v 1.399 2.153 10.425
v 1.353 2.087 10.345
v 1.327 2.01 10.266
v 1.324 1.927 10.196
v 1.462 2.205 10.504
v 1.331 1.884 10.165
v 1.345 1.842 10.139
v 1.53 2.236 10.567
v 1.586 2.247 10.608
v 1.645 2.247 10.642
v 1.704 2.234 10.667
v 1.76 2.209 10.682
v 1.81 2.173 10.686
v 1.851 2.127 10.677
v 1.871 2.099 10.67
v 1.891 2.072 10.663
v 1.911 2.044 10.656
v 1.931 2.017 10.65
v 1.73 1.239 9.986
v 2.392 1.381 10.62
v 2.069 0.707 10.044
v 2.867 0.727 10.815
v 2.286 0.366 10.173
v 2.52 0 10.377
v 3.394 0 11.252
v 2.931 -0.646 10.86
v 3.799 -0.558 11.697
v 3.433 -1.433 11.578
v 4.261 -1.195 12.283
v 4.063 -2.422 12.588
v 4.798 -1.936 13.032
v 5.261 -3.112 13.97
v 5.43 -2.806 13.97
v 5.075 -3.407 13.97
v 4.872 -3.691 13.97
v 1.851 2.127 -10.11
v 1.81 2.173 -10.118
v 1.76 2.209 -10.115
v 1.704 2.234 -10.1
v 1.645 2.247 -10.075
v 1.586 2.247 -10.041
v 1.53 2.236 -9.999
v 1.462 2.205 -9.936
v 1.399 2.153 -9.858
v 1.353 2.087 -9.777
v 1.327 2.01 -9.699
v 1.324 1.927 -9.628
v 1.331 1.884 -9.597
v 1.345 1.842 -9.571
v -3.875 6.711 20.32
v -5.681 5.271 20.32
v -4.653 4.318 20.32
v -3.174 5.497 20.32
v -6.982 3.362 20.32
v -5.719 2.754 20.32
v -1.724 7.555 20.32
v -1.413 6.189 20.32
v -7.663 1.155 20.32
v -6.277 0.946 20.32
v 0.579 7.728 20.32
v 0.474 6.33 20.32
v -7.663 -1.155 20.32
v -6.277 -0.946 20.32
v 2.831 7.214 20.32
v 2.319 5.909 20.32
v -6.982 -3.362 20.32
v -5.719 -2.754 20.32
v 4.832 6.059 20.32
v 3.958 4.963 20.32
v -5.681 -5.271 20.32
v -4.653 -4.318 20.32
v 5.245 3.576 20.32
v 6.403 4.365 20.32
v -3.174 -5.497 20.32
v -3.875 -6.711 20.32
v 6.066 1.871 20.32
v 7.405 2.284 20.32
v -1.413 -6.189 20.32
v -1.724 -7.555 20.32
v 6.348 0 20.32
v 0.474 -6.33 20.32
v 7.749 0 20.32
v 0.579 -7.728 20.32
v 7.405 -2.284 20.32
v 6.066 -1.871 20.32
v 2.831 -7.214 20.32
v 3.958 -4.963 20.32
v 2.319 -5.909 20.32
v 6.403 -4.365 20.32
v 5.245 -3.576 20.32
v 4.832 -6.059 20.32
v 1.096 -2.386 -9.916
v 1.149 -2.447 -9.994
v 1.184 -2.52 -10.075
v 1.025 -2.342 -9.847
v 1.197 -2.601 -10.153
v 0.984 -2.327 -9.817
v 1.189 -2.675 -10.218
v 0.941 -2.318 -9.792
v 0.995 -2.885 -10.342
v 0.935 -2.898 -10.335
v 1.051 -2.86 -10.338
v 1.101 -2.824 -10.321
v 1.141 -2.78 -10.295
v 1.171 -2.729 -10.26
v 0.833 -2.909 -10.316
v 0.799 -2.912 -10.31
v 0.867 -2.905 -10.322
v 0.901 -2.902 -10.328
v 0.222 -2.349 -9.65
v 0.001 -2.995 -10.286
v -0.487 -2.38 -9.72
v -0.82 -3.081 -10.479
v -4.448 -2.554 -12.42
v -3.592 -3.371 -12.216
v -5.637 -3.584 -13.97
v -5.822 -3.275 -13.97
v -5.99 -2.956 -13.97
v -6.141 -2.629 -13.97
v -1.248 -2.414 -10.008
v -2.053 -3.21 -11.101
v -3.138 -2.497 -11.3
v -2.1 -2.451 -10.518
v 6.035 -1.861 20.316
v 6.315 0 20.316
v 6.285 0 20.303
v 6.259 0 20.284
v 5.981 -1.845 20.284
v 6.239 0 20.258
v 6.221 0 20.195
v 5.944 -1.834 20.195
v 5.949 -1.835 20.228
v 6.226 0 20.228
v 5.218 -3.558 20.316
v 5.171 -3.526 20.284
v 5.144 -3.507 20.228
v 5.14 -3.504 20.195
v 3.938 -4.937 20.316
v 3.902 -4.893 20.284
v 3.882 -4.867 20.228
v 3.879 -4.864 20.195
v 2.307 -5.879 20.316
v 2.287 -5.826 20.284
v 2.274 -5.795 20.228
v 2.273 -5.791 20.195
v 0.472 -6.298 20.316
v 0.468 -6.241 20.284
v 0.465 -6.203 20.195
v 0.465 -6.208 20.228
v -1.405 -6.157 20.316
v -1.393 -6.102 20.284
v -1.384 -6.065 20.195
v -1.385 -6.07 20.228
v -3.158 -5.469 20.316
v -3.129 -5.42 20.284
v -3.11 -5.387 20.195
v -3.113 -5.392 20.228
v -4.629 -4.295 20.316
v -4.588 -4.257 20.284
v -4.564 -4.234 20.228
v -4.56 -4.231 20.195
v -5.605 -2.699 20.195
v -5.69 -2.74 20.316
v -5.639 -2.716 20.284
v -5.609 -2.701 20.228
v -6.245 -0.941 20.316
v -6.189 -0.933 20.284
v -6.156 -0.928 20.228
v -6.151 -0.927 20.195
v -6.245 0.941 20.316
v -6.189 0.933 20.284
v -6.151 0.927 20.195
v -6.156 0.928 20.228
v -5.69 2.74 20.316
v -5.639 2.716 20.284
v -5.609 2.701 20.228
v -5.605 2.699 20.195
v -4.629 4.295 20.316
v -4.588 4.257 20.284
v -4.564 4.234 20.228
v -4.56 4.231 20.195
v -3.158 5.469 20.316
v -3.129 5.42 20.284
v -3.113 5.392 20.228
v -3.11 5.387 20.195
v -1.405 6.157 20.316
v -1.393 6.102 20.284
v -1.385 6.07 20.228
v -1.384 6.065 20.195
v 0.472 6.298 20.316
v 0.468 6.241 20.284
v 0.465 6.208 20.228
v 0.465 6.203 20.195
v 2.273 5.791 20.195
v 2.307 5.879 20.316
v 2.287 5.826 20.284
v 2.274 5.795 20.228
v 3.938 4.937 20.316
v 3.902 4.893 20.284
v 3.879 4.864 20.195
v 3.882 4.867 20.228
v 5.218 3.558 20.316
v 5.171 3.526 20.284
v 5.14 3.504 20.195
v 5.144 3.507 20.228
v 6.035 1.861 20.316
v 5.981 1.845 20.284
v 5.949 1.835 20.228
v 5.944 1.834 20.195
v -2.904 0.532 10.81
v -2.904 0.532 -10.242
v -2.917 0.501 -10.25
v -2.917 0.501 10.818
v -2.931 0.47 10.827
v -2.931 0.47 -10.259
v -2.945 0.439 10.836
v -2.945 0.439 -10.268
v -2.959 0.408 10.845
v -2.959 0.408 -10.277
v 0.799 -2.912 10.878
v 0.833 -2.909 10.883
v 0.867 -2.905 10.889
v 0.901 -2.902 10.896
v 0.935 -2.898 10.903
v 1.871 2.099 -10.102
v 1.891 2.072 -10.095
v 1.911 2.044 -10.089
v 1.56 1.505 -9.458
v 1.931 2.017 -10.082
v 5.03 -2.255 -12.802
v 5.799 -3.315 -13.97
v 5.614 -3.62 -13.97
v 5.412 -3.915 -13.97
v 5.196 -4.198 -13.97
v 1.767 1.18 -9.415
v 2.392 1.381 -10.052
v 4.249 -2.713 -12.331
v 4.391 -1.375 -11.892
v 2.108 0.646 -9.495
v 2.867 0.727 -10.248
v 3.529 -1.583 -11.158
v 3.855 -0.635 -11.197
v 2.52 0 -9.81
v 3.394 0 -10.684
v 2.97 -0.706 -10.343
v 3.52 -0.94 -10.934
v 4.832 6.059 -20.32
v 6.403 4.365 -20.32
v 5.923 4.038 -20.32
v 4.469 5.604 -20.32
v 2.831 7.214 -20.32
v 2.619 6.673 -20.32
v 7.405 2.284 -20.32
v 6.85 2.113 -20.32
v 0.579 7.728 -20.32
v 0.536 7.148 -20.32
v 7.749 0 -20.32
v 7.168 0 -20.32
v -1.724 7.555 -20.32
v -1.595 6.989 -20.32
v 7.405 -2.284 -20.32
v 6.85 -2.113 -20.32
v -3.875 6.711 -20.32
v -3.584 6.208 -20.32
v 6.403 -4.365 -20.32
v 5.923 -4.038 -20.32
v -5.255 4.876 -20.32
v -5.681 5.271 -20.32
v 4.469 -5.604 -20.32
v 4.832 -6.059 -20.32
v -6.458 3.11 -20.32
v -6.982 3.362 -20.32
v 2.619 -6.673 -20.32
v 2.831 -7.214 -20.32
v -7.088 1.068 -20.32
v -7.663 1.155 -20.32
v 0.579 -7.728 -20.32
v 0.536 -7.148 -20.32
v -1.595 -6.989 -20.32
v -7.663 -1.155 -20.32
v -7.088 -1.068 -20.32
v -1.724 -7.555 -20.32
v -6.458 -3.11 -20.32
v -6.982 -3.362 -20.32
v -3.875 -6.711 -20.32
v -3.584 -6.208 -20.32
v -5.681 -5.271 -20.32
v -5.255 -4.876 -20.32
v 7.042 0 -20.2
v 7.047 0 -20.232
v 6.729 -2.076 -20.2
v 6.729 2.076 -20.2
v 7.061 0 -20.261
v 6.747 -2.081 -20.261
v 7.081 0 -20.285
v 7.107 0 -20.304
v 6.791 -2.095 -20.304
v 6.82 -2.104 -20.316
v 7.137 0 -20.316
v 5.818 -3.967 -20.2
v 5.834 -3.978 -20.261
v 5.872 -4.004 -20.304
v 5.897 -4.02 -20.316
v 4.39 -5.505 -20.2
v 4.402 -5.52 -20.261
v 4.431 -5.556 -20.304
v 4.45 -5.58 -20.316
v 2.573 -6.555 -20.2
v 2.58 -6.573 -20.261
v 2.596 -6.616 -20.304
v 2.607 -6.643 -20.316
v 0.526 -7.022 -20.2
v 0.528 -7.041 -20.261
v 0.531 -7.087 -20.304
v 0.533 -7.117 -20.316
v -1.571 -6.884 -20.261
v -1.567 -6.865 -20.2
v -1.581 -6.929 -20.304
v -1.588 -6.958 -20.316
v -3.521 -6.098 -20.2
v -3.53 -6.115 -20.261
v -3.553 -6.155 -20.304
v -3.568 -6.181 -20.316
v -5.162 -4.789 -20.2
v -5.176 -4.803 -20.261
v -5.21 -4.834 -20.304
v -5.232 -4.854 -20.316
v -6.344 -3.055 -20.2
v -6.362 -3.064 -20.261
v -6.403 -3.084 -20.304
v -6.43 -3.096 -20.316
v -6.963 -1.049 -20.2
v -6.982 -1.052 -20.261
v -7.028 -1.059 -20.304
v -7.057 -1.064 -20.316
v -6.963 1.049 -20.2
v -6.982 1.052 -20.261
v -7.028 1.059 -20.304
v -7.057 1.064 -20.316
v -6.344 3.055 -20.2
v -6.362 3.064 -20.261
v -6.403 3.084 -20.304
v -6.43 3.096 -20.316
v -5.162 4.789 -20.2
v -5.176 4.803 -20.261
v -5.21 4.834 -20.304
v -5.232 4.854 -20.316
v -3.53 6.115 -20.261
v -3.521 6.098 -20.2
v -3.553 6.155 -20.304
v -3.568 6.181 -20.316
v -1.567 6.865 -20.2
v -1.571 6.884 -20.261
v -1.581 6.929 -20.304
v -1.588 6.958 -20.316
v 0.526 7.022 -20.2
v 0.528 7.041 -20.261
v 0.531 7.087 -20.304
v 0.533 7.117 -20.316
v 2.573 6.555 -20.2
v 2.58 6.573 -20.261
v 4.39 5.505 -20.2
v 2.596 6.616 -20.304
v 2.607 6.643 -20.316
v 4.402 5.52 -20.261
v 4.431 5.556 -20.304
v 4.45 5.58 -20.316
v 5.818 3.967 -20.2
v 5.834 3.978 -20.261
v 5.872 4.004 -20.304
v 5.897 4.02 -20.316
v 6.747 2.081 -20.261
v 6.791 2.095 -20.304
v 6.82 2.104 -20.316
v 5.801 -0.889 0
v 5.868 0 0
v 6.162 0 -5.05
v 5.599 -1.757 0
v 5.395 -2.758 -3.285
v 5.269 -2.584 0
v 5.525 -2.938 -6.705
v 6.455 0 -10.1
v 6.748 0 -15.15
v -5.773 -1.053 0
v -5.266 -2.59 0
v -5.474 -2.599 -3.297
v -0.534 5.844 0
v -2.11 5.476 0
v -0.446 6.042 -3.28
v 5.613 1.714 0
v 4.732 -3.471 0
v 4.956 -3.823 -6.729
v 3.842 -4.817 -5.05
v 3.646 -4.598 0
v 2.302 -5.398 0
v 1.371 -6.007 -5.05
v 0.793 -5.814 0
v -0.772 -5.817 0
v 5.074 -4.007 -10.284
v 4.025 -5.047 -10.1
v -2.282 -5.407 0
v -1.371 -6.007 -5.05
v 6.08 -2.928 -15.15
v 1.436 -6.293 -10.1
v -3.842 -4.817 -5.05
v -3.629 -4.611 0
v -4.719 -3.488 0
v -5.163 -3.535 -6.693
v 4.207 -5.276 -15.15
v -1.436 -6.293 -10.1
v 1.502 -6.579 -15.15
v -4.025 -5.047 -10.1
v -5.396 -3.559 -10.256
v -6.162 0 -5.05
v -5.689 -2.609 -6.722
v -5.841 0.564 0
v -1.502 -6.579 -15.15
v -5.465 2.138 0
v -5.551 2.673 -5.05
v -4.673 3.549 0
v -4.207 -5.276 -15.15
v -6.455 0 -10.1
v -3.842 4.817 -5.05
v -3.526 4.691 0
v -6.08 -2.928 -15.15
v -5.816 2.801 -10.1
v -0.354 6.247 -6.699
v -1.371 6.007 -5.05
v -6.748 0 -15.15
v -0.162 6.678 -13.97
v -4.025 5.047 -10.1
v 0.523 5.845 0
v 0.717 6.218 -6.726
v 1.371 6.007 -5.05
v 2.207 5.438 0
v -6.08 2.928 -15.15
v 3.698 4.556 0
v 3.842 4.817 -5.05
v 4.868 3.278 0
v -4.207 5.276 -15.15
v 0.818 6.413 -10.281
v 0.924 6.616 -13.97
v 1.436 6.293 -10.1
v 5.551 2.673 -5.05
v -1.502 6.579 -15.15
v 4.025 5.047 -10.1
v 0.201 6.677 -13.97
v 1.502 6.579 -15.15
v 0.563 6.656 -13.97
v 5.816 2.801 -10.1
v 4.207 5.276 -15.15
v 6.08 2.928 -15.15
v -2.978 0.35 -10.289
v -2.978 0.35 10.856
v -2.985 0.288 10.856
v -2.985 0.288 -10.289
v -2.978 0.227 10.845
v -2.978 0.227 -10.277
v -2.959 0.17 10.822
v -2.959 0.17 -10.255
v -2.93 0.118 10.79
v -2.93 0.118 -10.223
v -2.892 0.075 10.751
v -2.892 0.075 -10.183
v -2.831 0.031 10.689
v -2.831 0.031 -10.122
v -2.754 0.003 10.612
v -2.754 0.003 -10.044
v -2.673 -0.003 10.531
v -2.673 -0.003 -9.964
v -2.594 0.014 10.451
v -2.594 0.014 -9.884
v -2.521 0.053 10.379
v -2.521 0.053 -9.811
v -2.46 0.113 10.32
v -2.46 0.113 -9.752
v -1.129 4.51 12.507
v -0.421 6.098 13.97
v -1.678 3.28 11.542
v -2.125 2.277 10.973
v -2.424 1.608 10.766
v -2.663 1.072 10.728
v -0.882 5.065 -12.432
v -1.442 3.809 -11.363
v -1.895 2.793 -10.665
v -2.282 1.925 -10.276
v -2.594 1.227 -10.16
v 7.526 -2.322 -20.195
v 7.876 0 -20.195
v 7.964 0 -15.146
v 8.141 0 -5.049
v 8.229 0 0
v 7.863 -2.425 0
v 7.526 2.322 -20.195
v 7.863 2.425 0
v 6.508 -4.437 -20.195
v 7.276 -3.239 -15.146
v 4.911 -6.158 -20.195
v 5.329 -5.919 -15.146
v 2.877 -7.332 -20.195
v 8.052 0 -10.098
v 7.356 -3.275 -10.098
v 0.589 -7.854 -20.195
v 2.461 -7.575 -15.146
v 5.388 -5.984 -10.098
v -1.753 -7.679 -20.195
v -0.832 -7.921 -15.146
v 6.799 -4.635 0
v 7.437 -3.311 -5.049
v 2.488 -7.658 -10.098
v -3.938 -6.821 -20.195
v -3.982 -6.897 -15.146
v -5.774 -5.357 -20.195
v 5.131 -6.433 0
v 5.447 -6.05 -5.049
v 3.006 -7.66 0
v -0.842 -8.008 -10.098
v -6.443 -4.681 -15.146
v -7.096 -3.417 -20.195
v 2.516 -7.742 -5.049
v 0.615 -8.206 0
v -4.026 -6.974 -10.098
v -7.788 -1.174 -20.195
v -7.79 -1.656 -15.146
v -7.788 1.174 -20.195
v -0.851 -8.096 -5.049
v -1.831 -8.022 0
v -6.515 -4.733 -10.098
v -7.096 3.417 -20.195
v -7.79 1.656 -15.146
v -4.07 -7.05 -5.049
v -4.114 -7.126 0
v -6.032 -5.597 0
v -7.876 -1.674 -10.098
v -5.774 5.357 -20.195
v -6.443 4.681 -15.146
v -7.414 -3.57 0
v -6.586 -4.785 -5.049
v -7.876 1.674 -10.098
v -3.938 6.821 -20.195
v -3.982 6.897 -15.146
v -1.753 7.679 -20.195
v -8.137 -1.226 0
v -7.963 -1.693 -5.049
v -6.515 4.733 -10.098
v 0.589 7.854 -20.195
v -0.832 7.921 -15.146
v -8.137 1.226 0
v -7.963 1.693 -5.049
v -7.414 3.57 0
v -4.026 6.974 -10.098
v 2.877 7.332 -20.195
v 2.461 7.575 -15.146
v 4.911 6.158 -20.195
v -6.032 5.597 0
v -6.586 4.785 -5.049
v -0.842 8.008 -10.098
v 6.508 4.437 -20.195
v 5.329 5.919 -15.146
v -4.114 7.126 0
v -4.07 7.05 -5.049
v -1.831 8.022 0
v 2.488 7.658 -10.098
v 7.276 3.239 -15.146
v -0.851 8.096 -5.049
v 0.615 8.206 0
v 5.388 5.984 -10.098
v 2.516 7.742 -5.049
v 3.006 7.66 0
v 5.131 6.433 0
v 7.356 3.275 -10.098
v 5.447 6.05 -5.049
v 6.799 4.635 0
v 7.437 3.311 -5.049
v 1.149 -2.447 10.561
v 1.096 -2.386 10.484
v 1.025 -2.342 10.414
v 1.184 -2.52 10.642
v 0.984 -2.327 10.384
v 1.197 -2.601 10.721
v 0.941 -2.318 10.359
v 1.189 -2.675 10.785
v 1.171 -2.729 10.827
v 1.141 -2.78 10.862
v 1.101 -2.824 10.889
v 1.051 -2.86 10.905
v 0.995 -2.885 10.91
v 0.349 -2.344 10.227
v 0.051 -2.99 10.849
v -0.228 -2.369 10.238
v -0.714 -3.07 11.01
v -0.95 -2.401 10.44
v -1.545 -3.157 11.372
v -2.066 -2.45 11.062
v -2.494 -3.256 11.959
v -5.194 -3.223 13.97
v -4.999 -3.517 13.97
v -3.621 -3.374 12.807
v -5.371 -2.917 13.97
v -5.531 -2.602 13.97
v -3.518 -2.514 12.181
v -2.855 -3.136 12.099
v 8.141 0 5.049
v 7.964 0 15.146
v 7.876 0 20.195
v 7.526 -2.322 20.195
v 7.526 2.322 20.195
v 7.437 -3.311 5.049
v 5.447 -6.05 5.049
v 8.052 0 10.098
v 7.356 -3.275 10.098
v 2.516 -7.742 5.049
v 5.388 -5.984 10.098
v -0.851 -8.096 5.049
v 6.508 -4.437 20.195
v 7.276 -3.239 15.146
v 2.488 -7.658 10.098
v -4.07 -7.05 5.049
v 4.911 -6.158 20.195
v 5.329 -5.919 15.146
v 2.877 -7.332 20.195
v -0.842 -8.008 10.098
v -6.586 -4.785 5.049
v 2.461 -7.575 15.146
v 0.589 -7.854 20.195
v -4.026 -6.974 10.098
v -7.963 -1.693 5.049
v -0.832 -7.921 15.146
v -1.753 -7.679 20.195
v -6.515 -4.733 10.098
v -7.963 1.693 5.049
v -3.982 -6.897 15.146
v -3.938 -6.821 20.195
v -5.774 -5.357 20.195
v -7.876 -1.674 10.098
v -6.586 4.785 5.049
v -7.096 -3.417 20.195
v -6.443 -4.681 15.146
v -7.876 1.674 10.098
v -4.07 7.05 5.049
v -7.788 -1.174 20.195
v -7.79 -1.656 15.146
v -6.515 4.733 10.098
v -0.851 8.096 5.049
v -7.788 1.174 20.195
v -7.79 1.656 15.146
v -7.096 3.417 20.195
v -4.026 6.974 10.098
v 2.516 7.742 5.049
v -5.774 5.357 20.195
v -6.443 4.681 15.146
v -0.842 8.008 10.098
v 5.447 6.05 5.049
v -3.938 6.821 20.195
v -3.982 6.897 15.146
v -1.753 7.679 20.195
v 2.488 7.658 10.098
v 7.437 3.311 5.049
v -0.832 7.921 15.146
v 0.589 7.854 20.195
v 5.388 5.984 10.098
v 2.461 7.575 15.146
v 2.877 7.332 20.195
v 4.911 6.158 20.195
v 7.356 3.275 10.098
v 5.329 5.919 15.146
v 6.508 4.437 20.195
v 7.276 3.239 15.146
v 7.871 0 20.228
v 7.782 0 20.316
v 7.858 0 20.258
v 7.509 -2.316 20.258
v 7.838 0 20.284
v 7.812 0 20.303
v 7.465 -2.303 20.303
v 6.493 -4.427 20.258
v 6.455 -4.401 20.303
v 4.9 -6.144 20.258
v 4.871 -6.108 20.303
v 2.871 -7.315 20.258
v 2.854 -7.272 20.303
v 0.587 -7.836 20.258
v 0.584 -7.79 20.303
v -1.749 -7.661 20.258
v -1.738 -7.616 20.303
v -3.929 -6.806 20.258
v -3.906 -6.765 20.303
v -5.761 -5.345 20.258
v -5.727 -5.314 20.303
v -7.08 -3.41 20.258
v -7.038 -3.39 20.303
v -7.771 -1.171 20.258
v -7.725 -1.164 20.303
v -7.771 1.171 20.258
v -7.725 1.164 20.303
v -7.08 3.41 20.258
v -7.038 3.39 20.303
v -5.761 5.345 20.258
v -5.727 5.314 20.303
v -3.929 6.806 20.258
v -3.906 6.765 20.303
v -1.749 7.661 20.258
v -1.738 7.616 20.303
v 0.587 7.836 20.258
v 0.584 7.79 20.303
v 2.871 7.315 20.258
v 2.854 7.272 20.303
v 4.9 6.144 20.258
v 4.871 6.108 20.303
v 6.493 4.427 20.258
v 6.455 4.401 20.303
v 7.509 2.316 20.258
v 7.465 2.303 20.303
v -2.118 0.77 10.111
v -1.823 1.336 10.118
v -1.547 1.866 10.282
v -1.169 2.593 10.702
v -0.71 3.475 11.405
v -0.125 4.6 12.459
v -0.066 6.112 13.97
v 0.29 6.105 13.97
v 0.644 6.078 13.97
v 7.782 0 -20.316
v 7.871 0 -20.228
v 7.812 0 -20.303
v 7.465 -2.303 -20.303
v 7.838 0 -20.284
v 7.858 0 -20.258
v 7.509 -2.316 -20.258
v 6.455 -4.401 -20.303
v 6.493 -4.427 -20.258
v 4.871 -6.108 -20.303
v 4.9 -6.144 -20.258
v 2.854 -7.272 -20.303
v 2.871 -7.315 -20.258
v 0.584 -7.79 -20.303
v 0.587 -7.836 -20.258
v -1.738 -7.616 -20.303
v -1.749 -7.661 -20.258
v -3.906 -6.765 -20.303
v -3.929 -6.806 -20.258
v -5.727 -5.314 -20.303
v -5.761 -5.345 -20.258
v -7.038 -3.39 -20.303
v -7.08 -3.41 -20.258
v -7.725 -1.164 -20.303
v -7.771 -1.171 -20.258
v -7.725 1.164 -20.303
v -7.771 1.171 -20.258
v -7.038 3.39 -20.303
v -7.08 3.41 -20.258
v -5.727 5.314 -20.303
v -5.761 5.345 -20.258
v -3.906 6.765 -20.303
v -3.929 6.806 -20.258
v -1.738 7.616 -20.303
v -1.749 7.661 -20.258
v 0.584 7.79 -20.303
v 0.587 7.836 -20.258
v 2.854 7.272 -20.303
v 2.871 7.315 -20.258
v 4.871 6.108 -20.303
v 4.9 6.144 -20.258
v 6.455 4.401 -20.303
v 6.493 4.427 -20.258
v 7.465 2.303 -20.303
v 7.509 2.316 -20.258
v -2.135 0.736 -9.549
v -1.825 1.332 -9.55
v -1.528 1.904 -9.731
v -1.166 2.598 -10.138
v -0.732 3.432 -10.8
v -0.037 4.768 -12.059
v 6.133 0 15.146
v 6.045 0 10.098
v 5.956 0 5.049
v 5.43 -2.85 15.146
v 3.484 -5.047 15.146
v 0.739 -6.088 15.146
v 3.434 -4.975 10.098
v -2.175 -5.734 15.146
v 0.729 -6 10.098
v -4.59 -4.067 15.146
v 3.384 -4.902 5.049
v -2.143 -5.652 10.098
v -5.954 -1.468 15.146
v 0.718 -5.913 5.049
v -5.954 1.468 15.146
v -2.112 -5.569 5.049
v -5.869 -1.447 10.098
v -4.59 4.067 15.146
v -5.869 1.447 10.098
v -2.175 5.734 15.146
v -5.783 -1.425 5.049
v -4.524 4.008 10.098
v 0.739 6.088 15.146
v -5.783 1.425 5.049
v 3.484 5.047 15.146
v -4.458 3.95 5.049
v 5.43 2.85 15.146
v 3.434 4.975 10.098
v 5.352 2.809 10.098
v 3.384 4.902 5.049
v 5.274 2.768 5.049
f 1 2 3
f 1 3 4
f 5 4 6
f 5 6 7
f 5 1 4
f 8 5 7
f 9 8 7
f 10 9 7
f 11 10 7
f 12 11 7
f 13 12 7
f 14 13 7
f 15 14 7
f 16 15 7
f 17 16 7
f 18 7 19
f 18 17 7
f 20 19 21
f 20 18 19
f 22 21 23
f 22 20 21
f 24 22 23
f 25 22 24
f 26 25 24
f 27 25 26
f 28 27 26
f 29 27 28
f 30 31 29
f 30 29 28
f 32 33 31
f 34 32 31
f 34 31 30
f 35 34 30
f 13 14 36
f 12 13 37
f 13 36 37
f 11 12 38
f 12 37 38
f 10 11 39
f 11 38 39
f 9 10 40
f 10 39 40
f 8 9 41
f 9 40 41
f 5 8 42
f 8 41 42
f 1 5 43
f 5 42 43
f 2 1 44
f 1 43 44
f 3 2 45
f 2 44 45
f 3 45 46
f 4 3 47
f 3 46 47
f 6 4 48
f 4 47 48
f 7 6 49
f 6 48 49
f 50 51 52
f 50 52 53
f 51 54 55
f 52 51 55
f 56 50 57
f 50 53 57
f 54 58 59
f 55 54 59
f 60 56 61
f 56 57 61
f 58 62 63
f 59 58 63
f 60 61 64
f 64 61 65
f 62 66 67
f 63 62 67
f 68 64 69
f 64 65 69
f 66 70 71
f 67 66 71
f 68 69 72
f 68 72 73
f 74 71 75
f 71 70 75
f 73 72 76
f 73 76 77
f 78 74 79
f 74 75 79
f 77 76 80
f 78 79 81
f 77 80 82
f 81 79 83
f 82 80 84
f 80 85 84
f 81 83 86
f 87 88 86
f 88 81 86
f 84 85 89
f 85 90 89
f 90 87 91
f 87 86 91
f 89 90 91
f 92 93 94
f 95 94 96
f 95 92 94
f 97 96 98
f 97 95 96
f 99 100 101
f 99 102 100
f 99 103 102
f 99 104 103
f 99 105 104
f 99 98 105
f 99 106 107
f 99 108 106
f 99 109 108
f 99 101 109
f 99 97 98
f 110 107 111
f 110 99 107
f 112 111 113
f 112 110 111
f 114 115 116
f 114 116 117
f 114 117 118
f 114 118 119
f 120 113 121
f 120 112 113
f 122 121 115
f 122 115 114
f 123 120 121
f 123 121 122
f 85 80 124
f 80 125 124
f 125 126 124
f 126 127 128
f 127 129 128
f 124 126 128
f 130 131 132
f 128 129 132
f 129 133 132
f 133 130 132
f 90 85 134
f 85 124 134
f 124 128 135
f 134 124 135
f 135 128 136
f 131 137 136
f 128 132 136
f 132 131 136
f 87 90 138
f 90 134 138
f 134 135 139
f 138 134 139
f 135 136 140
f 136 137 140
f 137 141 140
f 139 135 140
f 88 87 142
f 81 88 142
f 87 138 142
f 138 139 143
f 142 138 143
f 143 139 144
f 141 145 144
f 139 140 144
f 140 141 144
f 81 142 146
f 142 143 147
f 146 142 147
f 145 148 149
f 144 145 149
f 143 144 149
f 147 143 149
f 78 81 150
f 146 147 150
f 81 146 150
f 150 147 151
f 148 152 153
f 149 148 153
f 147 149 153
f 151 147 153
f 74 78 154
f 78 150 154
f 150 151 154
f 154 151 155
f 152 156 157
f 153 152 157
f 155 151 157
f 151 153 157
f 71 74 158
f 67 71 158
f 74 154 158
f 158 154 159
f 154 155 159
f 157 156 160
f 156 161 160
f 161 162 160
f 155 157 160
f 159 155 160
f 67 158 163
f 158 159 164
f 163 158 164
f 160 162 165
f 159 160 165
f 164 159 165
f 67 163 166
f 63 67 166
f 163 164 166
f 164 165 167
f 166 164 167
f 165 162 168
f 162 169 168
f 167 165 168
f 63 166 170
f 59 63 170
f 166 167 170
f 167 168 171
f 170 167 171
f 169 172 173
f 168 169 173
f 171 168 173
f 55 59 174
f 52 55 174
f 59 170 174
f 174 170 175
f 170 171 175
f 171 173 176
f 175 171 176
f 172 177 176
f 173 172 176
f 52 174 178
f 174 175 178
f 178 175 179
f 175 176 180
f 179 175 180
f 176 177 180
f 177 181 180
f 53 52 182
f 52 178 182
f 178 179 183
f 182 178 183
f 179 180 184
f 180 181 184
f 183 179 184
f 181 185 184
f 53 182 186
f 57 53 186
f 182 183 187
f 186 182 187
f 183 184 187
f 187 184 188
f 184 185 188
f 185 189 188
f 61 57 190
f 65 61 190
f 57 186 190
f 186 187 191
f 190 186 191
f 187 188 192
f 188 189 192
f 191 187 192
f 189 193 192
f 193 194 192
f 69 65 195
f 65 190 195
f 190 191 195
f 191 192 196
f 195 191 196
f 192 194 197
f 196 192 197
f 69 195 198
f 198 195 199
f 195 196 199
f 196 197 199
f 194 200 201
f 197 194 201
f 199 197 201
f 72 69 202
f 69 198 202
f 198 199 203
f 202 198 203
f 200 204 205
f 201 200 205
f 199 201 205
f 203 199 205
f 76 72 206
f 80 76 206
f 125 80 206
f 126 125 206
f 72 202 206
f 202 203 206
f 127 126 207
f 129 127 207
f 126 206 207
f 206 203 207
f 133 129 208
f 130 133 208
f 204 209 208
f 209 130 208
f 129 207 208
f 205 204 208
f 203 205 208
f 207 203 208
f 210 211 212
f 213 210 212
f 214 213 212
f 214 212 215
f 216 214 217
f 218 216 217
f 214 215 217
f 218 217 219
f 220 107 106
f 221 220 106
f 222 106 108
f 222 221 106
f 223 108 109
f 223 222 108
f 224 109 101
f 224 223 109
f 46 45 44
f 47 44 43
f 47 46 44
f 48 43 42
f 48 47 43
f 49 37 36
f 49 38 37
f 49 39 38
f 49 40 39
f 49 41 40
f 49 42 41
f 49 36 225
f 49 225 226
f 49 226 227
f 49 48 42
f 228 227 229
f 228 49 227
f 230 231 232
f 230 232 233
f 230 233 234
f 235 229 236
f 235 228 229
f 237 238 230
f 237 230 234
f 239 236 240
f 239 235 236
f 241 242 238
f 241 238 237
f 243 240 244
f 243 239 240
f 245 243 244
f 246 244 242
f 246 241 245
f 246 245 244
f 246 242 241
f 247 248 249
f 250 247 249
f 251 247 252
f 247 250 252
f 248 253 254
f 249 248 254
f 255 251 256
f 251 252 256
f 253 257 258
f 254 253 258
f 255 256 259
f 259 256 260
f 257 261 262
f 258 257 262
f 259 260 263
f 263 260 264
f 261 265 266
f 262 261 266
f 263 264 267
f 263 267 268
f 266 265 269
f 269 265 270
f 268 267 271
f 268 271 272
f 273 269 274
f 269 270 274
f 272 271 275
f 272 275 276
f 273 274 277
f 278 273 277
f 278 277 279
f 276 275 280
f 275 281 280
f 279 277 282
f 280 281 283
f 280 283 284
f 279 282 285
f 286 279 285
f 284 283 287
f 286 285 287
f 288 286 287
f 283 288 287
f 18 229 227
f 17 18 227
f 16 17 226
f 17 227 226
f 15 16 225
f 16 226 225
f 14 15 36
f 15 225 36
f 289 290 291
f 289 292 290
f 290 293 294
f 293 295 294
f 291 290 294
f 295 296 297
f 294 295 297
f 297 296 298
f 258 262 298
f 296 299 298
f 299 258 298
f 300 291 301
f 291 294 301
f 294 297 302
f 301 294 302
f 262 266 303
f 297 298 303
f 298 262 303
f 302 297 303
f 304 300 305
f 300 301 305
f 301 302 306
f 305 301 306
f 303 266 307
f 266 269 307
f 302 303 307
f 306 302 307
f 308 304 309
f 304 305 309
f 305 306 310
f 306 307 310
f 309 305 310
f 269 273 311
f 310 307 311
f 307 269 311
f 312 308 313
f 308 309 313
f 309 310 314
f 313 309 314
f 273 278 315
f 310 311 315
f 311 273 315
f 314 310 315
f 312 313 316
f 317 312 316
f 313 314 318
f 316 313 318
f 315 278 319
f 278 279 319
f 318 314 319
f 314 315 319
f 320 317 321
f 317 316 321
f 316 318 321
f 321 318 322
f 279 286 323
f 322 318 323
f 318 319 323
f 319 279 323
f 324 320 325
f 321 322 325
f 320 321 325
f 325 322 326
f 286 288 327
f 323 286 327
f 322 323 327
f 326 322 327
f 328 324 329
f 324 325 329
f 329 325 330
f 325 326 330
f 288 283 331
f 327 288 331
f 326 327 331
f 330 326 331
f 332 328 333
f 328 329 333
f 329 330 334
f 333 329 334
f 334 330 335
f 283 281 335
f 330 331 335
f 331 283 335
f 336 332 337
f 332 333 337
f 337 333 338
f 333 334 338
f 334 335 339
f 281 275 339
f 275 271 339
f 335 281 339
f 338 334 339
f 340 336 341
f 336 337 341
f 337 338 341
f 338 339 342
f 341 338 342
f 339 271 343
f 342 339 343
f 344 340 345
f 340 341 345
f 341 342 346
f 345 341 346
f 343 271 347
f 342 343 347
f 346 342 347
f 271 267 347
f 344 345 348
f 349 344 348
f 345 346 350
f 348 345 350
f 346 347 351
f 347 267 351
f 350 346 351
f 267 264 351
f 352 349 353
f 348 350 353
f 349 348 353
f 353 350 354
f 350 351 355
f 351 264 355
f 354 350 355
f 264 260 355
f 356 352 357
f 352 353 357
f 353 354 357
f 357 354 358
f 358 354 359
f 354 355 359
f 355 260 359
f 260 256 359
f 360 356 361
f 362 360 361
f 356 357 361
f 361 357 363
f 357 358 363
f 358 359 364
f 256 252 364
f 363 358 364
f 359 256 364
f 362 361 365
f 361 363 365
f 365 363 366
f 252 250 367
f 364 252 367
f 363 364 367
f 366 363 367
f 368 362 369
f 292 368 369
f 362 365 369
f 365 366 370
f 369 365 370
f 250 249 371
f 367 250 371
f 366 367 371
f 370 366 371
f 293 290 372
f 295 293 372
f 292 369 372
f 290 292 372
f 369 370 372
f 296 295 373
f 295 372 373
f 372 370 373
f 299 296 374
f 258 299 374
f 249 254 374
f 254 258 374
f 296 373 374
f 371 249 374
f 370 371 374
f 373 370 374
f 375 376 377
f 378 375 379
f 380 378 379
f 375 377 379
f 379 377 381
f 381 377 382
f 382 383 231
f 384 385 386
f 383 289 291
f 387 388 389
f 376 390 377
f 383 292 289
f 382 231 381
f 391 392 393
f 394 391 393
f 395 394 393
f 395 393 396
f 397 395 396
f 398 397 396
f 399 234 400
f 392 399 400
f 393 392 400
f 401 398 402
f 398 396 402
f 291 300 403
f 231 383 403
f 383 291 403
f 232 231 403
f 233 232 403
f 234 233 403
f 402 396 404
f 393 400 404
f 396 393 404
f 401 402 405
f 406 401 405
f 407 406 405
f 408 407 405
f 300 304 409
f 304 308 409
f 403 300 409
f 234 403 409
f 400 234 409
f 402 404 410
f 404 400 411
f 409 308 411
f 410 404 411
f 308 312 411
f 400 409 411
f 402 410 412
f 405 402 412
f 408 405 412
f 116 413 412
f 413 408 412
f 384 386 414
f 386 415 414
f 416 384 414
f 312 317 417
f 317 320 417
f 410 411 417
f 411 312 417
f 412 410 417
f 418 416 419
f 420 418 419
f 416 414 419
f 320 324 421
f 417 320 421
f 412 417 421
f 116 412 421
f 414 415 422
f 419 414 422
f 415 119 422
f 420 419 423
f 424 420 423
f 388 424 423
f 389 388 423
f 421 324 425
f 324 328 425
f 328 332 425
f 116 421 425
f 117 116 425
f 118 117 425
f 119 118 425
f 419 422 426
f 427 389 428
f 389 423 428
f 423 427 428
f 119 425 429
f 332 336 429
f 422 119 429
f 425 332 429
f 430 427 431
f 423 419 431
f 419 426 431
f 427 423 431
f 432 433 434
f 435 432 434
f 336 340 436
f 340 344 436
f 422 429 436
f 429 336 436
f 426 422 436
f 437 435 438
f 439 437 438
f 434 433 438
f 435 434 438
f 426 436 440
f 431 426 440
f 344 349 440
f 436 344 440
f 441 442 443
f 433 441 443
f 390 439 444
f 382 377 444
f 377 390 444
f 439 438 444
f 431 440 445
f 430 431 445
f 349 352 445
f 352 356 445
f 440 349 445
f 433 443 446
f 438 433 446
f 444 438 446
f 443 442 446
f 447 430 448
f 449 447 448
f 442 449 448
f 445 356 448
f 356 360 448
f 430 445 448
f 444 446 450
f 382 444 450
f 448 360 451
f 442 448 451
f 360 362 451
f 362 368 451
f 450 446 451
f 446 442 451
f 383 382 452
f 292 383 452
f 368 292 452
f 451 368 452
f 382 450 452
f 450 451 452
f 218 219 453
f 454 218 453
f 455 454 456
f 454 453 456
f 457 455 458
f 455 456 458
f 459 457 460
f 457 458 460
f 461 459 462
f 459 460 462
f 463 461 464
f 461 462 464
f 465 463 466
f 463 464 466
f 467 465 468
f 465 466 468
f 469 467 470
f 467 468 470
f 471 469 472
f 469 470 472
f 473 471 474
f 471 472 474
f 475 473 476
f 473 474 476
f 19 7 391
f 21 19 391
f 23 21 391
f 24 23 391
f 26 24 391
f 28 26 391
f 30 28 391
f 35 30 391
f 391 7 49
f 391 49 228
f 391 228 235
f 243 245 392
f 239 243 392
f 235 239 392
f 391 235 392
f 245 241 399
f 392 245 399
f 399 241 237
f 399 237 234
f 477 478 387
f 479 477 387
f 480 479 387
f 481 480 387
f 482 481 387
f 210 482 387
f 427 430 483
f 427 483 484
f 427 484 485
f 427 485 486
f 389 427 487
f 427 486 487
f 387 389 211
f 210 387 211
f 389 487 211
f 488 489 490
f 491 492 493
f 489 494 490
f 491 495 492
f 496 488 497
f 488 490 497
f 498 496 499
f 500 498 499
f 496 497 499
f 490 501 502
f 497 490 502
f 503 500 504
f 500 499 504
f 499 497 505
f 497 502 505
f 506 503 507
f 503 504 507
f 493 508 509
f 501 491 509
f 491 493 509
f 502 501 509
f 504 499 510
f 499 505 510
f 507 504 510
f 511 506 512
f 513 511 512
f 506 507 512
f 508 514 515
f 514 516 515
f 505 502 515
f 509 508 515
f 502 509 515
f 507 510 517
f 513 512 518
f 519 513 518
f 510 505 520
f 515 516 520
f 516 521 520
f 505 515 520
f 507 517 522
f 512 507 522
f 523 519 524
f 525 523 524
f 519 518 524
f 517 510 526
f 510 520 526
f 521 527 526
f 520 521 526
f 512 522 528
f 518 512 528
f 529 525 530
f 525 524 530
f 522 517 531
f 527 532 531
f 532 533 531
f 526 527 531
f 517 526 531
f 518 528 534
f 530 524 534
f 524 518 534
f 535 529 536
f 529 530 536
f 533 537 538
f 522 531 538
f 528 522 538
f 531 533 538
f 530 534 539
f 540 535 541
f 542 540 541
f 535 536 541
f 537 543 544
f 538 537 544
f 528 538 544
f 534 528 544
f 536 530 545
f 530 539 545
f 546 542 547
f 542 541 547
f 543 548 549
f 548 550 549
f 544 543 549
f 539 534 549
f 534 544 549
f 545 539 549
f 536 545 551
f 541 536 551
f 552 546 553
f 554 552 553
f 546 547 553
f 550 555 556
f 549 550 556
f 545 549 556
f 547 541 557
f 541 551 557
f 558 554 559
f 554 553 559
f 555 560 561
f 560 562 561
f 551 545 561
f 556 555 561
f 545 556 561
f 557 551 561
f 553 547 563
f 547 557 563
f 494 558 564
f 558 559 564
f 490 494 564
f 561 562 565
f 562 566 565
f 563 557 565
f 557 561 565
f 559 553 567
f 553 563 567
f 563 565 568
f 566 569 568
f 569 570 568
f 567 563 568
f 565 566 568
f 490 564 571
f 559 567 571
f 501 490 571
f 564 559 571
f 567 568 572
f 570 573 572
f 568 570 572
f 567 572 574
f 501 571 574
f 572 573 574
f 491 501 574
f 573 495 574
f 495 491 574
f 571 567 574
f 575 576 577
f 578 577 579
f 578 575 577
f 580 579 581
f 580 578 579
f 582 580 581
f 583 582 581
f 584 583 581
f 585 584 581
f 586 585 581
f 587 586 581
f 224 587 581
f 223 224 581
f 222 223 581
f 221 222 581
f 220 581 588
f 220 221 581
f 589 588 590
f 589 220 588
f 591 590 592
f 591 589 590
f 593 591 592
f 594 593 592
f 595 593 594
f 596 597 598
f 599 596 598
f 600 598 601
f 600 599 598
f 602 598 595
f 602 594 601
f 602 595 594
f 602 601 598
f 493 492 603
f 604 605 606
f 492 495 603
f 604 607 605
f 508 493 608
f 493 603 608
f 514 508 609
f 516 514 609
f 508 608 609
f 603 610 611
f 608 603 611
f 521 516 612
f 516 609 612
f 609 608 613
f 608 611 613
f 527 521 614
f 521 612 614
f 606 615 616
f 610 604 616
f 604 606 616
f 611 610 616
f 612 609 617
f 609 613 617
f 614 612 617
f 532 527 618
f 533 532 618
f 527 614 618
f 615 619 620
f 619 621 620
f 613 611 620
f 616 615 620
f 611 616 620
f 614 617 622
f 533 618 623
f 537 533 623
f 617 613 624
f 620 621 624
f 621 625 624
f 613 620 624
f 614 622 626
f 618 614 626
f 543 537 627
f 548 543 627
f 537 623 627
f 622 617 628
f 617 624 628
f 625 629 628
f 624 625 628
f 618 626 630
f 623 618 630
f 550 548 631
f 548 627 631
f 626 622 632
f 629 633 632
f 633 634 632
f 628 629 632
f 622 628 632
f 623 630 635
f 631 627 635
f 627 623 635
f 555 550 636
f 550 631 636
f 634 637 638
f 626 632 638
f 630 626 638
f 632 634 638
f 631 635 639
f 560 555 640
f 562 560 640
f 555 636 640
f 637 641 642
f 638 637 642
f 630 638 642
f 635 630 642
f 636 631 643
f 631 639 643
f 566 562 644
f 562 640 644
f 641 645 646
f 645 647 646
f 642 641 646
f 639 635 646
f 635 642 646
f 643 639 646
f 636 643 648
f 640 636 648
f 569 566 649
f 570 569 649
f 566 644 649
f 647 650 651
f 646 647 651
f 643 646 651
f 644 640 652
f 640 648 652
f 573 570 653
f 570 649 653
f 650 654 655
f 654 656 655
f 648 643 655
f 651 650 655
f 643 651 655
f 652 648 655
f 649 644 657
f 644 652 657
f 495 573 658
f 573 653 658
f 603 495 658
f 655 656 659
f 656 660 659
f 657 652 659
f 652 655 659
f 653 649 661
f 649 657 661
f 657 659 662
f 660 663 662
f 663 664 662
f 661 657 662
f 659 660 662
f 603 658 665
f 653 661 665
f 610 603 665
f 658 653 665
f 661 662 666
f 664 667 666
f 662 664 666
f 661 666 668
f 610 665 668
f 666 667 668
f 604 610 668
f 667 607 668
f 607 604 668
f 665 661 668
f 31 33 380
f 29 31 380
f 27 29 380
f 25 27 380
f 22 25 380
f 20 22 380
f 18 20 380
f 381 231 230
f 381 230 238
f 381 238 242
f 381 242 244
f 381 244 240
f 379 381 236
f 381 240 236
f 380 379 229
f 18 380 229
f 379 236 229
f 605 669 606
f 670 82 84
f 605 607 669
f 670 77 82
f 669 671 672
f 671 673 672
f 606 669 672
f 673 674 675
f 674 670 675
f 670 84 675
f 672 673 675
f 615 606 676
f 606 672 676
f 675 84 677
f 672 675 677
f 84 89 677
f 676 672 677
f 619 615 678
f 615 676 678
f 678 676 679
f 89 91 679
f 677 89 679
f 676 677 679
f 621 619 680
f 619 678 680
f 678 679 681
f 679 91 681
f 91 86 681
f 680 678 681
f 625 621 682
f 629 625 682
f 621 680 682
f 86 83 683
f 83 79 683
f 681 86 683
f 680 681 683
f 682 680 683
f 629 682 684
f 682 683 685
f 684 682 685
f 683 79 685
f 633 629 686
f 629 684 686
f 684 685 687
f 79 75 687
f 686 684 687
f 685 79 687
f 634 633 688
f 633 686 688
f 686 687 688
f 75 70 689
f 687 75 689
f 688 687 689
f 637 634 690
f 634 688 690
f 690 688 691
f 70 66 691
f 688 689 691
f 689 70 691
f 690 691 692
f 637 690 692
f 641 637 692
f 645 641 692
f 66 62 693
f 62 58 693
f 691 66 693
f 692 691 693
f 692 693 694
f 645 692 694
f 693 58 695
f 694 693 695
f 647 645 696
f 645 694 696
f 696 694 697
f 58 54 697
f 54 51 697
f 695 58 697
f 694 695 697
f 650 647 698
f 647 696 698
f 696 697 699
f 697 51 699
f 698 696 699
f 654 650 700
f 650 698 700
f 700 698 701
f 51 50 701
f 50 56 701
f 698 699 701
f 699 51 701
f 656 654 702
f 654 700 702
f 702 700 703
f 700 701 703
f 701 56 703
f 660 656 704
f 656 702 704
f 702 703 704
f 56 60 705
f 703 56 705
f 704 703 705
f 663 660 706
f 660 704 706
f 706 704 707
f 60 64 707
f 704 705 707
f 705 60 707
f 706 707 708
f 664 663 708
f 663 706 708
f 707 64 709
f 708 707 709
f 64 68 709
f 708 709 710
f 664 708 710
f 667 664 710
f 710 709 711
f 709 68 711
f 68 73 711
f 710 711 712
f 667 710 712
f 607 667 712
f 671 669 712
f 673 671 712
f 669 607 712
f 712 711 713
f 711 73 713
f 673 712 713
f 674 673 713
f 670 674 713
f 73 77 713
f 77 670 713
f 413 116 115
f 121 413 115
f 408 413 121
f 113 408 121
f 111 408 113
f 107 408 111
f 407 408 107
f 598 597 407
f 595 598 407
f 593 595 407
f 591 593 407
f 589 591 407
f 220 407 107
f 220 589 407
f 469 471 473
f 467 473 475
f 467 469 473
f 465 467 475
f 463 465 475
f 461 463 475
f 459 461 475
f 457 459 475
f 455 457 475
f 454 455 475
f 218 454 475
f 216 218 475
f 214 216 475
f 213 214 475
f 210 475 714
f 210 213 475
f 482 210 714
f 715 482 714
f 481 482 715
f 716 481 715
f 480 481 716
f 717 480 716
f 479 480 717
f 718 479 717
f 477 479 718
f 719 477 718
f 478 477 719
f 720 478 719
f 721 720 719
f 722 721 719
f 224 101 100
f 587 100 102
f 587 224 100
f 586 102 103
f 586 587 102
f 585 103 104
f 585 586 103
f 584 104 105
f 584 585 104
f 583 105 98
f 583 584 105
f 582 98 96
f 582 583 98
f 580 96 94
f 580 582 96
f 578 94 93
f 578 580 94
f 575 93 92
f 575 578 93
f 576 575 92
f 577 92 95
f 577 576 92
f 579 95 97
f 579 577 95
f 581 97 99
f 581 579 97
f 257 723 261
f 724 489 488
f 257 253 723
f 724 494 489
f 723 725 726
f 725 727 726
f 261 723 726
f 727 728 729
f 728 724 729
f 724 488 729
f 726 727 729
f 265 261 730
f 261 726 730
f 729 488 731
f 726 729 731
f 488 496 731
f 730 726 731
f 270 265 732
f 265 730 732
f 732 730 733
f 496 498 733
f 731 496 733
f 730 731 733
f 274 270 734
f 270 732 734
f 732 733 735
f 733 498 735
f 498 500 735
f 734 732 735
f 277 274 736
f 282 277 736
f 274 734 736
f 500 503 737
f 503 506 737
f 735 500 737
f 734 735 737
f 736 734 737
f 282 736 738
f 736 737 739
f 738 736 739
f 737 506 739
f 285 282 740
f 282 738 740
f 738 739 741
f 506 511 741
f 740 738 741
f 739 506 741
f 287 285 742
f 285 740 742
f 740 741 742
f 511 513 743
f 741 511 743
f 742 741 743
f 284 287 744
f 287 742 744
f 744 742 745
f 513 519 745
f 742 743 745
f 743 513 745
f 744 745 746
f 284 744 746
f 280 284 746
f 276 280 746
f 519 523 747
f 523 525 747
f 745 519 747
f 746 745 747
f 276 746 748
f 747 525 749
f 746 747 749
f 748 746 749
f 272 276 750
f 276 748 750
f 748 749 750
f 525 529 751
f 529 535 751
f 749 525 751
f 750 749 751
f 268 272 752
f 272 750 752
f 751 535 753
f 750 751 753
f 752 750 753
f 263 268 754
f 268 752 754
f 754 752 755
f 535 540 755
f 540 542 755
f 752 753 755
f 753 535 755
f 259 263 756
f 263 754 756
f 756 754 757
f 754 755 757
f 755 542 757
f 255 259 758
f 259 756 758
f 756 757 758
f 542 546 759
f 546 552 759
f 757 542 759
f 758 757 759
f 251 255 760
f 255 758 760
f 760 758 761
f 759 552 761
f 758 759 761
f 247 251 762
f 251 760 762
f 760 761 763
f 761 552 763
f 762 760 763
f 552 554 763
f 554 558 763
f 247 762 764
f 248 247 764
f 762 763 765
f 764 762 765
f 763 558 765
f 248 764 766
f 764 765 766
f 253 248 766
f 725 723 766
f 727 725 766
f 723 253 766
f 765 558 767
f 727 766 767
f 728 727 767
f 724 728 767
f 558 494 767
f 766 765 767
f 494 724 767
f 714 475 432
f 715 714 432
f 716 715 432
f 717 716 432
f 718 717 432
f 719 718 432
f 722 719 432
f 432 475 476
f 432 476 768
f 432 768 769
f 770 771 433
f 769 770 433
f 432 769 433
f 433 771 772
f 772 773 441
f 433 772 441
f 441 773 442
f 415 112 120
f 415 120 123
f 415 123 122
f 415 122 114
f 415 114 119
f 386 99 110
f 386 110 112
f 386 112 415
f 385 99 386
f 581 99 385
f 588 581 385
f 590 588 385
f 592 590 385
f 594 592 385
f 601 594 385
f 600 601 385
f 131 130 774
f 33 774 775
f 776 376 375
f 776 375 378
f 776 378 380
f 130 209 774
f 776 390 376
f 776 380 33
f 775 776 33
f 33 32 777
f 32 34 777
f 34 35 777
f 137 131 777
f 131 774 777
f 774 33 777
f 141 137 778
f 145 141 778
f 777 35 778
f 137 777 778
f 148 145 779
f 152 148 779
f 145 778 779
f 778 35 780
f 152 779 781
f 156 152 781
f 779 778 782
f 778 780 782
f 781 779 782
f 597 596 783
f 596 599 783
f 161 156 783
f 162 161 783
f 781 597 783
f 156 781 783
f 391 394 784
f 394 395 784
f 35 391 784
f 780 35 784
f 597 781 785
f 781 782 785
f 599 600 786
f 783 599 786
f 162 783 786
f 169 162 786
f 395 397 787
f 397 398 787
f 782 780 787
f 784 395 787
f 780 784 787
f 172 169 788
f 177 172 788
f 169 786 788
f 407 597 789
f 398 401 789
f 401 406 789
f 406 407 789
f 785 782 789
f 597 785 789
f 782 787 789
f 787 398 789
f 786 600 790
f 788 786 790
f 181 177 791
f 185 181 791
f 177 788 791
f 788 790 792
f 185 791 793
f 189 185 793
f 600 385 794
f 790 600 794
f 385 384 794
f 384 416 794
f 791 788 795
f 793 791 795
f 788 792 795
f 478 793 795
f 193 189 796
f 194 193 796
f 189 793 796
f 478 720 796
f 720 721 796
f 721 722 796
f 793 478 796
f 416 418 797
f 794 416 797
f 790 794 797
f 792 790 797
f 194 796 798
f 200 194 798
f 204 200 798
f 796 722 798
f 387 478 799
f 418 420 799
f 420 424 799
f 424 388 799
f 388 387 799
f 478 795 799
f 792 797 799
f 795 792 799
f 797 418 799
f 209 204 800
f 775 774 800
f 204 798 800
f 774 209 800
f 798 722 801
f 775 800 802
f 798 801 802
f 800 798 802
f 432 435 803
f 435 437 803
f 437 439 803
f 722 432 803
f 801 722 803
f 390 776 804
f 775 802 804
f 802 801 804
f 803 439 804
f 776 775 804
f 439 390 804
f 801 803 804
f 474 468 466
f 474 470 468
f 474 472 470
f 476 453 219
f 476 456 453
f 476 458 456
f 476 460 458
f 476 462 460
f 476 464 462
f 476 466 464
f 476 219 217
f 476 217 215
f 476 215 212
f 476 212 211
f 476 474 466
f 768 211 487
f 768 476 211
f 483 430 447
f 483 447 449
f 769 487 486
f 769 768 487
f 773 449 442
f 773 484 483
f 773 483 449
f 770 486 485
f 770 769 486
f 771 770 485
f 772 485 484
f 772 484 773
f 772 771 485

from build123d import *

# Parameters (mm, degrees)
F3_DEPTH = 13.97


with BuildPart() as f1:
    # F0 (on Front) → F1 (revolve)
    with BuildSketch(Plane.XZ):
        with BuildLine():
            Line((7.876178, -20.195216), (8.228687, 0))
            Line((8.228687, 0), (7.876178, 20.195216))
            ThreePointArc((7.876178, 20.195216), (7.838213, 20.283583), (7.749197, 20.32))
            Line((7.749197, 20.32), (6.347803, 20.32))
            ThreePointArc((6.347803, 20.32), (6.258787, 20.283583), (6.220822, 20.195216))
            Line((6.220822, 20.195216), (5.868313, 0))
            Line((5.868313, 0), (7.041552, -20.200364))
            ThreePointArc((7.041552, -20.200364), (7.081178, -20.285369), (7.168338, -20.32))
            Line((7.168338, -20.32), (7.749197, -20.32))
            ThreePointArc((7.749197, -20.32), (7.838213, -20.283583), (7.876178, -20.195216))
        make_face()
    revolve(axis=Axis((0, 0, 5.243593), (0, 0, -1)))

    # F2 (on Top) → F3 (join, symmetric)
    with BuildSketch(Plane.XY):
        with BuildLine():
            Line((-2.459506, 0.112758), (1.096672, 6.948127))
            ThreePointArc((1.096672, 6.948127), (0.550133, 7.015935), (0, 7.041552))
            Line((0, 7.041552), (-2.903674, 0.532035))
            Line((-2.903674, 0.532035), (-2.959069, 0.407848))
            ThreePointArc((-2.959069, 0.407848), (-2.841238, 0.036922), (-2.459506, 0.112758))
        make_face()
        with BuildLine():
            ThreePointArc((5.486935, -4.655437), (5.818928, -4.216025), (6.116179, -3.752404))
            Line((6.116179, -3.752404), (1.930609, 2.01701))
            Line((1.930609, 2.01701), (1.850757, 2.127077))
            ThreePointArc((1.850757, 2.127077), (1.470611, 2.210495), (1.345421, 1.841988))
            Line((1.345421, 1.841988), (5.486935, -4.655437))
        make_face()
        with BuildLine():
            Line((0.940514, -2.31779), (-6.757178, -2.655735))
            ThreePointArc((-6.757178, -2.655735), (-6.542632, -3.162955), (-6.28975, -3.652192))
            Line((-6.28975, -3.652192), (0.799493, -2.912089))
            Line((0.799493, -2.912089), (0.93474, -2.897969))
            ThreePointArc((0.93474, -2.897969), (1.197055, -2.610462), (0.940514, -2.31779))
        make_face()
    extrude(amount=F3_DEPTH, both=True)

    # F4 (on Front) → F5 (revolve, cut)
    with BuildSketch(Plane.XZ):
        Polygon((6.11216, 13.97), (0, 13.97), (0, 7.85784), align=None)
        Polygon((0, -7.290308), (0, -13.97), (6.679692, -13.97), align=None)
    revolve(axis=Axis((0, 0, 5.243593), (0, 0, -1)), mode=Mode.SUBTRACT)


solid = f1.part
